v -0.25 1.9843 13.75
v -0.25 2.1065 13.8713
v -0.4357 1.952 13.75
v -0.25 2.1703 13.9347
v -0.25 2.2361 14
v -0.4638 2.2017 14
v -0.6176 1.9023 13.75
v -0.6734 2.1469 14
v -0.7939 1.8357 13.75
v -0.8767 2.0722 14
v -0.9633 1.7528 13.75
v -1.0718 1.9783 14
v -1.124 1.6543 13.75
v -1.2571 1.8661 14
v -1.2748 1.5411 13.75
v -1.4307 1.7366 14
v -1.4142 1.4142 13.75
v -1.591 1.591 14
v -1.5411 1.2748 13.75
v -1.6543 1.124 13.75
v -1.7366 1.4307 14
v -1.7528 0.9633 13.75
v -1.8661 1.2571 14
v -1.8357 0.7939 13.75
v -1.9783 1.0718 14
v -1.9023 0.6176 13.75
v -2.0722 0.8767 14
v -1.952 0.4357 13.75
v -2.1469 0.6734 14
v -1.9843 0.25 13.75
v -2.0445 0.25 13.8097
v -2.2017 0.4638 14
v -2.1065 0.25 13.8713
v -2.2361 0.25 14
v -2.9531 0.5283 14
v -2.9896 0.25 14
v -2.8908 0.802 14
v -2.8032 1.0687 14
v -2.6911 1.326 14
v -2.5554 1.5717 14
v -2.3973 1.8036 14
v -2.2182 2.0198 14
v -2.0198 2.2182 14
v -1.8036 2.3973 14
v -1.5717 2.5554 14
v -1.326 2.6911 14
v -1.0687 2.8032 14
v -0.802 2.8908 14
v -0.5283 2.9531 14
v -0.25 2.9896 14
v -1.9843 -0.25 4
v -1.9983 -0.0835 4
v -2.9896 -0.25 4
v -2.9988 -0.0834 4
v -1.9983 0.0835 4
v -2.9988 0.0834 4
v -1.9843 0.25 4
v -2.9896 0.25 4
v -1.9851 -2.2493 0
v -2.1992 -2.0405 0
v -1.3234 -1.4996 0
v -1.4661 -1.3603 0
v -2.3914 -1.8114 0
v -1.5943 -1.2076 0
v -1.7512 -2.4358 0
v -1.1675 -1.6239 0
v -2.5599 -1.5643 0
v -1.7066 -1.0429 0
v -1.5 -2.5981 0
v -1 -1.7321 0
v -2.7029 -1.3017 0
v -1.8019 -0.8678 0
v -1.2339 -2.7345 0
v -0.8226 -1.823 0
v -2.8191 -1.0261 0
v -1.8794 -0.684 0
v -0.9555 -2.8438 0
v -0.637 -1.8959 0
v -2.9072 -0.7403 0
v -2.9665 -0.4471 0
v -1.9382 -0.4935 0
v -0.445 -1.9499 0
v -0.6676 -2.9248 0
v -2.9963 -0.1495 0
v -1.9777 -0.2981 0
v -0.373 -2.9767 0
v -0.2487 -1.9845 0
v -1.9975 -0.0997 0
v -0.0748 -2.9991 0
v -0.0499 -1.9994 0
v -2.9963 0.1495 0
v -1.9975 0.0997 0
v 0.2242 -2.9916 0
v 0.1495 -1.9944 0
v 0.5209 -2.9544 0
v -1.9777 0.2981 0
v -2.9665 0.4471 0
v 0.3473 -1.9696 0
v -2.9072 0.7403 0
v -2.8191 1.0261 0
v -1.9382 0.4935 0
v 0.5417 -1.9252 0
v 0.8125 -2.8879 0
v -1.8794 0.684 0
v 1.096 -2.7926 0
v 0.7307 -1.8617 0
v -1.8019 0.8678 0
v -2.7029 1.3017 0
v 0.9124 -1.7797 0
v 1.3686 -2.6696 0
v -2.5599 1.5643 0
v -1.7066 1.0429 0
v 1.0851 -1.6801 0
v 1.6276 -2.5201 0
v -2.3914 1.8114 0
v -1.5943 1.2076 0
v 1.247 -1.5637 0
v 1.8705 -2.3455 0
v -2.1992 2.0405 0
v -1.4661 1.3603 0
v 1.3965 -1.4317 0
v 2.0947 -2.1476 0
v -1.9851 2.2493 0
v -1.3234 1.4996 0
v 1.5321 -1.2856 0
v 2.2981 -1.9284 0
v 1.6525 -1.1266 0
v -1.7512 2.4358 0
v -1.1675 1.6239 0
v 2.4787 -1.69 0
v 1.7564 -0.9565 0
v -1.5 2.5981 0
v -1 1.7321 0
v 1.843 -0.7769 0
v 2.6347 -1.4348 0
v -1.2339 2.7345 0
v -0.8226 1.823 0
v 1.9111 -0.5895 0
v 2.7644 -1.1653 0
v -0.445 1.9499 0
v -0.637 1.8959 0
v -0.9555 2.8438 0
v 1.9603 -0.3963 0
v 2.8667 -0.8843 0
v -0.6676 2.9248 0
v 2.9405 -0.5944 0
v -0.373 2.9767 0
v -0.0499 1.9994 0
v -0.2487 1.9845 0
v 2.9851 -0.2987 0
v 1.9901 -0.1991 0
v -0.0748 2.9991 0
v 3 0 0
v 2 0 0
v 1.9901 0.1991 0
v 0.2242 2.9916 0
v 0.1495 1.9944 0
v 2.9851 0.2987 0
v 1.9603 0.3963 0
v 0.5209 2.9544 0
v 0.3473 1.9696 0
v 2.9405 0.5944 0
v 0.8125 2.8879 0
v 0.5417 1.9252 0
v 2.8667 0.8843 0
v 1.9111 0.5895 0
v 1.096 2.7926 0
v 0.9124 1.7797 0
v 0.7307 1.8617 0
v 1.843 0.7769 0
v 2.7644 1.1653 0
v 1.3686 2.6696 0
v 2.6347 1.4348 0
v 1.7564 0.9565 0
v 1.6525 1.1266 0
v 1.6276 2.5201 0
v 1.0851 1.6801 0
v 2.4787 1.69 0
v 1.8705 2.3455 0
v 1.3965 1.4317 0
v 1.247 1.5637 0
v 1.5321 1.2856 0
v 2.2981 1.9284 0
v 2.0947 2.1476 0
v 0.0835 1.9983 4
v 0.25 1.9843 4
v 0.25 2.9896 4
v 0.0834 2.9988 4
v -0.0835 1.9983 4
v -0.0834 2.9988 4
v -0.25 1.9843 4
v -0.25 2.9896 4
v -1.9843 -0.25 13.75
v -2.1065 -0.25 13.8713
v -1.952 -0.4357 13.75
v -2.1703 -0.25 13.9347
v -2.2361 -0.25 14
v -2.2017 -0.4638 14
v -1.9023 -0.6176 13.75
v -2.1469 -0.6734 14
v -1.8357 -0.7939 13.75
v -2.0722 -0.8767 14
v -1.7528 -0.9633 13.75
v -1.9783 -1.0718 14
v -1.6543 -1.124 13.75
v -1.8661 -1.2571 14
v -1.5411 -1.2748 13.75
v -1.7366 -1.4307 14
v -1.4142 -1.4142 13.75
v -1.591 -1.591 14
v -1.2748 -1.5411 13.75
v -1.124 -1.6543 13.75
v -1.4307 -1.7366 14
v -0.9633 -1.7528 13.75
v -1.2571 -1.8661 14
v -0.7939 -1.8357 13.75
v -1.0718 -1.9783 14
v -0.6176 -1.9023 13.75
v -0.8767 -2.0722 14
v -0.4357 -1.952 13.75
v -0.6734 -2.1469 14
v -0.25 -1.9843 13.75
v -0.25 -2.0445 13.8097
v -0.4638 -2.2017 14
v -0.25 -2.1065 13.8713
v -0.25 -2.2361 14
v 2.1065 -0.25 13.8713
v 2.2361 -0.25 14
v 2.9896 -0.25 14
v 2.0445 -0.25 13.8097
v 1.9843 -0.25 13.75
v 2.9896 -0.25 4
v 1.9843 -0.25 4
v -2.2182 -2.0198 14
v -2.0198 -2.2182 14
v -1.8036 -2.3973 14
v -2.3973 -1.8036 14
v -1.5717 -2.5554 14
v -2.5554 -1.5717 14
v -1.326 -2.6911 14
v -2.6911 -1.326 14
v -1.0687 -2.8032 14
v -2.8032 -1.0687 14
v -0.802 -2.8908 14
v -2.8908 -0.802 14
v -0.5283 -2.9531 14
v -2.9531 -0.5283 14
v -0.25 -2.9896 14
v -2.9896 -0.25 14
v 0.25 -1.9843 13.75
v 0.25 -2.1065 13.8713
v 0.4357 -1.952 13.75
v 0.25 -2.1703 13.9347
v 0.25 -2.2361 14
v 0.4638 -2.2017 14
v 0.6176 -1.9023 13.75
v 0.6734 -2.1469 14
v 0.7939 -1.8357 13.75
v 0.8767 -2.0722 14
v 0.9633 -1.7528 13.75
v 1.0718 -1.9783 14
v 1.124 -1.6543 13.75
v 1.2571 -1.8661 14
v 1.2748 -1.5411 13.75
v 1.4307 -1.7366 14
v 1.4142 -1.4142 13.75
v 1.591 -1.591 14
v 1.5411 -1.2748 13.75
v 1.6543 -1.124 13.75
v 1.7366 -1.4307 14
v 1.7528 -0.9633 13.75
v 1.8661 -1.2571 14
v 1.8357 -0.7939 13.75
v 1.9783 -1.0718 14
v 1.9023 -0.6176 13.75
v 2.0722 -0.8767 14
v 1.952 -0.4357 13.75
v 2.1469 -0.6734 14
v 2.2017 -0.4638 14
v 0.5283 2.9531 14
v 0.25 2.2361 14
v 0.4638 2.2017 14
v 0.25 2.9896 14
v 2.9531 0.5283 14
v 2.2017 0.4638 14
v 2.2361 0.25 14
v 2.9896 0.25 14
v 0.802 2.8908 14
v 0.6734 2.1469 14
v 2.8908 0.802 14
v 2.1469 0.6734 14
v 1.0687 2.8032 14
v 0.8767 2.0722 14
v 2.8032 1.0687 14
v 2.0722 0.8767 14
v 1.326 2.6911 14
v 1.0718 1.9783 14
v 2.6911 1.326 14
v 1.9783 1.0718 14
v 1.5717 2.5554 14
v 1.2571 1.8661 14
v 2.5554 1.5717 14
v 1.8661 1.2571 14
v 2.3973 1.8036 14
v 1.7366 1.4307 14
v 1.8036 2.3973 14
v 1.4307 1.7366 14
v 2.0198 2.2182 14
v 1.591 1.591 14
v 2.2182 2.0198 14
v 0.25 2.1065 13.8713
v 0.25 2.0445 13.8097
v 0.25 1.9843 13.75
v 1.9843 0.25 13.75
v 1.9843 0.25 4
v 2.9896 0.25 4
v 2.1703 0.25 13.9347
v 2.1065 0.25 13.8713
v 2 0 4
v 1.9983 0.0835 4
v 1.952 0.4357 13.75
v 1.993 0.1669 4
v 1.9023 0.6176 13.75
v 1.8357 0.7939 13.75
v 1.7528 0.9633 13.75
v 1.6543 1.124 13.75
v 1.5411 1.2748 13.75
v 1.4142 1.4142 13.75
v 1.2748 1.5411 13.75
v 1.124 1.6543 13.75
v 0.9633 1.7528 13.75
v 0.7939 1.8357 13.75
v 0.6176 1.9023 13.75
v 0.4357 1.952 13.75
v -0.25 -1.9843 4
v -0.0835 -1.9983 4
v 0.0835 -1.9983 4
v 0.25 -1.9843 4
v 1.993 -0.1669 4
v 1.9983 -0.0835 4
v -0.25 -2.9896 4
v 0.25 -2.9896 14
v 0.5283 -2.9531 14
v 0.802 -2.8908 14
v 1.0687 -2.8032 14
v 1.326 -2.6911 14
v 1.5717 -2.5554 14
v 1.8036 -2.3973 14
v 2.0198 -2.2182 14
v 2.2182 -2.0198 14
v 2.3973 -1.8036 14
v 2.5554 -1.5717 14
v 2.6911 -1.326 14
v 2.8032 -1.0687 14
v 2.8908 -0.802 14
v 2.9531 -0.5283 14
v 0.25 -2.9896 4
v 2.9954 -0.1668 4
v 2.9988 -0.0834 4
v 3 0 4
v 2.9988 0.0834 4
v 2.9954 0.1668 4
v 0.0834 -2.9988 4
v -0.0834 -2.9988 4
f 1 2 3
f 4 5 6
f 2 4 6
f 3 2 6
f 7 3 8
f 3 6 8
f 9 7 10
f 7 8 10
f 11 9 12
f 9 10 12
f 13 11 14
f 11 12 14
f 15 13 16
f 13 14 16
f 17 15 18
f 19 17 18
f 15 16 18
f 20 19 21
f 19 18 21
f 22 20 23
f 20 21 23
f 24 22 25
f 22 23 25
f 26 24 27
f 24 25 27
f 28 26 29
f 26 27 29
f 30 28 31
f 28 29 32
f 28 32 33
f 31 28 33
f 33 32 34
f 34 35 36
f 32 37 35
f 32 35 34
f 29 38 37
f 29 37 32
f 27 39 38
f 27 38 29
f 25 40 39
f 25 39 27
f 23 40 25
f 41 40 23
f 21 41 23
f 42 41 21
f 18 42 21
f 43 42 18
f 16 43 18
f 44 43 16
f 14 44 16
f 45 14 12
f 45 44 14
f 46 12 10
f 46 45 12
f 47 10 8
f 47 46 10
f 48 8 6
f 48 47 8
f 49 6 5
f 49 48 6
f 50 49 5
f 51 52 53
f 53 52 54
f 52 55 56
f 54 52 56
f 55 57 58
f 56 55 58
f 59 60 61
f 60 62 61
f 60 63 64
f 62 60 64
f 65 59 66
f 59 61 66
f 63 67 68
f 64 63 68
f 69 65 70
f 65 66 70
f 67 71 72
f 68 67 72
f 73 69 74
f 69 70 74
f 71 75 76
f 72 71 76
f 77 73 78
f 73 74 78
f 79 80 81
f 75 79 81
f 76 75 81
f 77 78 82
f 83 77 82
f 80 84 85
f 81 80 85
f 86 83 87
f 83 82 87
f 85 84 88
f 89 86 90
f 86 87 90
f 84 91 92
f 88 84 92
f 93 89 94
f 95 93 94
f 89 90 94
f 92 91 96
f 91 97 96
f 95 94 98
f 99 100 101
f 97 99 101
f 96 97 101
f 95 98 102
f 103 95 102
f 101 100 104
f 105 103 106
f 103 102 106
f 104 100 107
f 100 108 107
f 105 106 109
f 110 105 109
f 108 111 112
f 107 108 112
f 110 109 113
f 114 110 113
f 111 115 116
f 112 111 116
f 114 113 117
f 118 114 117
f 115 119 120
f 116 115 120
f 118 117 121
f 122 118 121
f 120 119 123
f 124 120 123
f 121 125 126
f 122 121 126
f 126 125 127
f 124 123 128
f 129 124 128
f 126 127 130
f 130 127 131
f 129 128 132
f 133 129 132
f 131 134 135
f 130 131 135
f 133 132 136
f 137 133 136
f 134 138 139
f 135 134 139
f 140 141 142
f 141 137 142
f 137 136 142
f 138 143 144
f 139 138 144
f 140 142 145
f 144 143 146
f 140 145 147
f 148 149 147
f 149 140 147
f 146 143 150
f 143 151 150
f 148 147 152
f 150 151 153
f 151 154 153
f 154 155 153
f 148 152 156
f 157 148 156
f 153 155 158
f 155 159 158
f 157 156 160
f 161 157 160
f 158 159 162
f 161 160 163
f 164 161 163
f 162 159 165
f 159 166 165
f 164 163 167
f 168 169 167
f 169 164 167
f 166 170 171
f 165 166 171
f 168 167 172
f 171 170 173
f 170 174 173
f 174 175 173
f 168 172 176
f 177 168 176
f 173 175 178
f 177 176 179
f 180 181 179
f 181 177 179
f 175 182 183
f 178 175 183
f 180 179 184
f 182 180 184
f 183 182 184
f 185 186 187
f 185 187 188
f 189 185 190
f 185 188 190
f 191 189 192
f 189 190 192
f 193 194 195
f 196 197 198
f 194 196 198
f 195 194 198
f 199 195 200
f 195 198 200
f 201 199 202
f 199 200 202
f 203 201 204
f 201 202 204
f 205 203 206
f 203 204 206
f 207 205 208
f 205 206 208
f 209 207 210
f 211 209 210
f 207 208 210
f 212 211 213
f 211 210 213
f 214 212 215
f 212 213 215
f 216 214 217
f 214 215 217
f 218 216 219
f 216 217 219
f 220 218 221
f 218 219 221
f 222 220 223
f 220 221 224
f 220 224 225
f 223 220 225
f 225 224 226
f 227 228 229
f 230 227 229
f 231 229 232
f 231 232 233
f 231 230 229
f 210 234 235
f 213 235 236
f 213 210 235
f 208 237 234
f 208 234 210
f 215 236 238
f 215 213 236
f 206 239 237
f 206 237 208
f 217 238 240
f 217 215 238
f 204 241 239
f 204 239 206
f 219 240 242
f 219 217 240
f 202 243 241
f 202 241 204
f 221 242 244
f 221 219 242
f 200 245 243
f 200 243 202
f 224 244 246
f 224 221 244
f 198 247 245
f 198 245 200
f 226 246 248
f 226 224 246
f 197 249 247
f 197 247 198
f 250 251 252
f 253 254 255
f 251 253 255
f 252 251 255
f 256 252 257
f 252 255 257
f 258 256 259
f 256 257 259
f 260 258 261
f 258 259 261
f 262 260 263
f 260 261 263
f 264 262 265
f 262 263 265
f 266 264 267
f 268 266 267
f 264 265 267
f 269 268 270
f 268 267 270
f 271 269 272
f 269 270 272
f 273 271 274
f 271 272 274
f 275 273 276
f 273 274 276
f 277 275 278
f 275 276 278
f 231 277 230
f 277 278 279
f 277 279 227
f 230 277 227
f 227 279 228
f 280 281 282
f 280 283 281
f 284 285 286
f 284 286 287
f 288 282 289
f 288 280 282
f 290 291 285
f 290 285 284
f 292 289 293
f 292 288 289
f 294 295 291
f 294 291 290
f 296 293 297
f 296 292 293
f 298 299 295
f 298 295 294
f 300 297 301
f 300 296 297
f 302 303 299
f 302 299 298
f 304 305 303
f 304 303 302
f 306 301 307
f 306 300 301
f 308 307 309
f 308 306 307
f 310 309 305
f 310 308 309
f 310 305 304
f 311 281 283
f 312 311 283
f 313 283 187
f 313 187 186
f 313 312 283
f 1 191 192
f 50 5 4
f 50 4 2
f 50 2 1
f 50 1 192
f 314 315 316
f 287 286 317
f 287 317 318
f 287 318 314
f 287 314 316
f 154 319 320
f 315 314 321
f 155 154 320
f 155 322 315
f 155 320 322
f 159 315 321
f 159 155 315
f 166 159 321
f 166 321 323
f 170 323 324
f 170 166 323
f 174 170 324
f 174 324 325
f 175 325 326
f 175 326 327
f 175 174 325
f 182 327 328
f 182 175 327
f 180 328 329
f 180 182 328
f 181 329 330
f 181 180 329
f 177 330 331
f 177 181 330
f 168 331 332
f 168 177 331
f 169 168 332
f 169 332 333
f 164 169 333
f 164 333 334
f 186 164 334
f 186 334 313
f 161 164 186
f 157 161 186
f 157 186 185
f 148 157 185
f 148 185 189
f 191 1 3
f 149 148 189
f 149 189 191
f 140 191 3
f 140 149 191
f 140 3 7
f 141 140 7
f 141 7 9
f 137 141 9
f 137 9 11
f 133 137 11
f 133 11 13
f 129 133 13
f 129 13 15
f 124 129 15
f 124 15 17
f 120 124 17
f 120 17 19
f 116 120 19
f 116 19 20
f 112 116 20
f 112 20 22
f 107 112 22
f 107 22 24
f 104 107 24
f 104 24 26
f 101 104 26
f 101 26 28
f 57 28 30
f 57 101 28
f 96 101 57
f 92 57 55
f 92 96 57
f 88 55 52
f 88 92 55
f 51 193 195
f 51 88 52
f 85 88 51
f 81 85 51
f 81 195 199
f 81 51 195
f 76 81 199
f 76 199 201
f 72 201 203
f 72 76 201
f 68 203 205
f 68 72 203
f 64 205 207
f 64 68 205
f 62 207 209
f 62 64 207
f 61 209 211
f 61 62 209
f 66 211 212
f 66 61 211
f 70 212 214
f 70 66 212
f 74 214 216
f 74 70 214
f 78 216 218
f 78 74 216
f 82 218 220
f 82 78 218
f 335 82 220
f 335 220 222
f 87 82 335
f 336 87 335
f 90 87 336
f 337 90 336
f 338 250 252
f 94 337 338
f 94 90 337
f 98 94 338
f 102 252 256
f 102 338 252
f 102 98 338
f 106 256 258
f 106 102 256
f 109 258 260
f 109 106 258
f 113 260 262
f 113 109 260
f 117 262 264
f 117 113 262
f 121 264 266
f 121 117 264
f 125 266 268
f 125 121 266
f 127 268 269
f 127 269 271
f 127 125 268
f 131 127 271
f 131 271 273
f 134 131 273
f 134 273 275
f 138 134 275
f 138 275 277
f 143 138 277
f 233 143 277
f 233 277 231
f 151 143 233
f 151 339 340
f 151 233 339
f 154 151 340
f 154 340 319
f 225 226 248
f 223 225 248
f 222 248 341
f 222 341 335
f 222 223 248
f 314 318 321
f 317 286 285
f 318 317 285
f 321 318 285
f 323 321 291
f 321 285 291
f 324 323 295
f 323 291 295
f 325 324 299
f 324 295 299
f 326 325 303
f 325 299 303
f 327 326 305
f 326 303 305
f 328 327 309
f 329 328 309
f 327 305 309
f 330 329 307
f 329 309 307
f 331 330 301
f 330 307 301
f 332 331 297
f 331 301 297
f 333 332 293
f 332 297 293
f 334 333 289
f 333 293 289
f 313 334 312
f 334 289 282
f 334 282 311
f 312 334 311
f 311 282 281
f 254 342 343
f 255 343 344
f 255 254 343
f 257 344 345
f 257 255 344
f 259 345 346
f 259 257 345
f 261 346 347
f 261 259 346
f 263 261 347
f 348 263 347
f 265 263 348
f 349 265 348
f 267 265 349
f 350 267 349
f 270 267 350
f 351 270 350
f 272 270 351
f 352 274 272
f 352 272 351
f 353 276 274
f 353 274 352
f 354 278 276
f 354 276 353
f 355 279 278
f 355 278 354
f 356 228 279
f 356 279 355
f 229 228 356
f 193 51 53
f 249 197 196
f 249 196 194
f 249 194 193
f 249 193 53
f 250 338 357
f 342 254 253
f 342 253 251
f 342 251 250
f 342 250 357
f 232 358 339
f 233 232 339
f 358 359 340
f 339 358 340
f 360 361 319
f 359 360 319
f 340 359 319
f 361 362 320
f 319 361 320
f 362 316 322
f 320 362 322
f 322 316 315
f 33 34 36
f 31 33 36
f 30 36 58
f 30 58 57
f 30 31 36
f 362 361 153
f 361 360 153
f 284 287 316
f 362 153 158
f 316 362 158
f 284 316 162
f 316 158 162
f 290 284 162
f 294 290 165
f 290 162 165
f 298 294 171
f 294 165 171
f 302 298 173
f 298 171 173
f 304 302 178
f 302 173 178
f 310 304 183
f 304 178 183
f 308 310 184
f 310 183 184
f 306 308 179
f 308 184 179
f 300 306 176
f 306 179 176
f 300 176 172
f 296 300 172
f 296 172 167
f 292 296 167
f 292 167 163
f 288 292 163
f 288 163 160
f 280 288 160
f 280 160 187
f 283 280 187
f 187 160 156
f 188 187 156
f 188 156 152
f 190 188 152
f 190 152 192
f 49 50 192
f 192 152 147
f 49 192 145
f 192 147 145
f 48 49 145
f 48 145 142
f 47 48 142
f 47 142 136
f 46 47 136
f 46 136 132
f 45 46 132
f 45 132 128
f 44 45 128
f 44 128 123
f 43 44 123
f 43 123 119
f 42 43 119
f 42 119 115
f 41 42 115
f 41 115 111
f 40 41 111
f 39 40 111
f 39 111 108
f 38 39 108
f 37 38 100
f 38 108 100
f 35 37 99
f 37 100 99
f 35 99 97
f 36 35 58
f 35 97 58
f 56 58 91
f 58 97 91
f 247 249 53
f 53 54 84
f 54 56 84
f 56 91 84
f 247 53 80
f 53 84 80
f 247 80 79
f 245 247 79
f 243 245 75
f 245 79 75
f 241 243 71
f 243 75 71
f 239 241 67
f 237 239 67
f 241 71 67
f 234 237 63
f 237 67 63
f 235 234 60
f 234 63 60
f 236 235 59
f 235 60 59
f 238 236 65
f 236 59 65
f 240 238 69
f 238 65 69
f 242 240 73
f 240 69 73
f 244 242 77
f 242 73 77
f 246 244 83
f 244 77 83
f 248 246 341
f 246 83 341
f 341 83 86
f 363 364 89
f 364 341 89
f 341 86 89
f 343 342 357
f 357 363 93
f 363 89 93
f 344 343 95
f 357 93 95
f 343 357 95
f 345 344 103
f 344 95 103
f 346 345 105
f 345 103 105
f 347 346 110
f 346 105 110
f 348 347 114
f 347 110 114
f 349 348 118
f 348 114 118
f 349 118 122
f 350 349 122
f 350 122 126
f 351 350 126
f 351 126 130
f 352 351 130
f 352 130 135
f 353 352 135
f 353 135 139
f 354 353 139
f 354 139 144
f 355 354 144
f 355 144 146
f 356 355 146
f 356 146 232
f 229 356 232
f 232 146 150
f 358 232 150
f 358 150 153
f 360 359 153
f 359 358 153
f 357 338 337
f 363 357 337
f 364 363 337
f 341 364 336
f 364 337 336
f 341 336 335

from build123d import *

# Parameters (mm, degrees)
ESQUISSE1_R             = 3
ESQUISSE1_R_2           = 2
EXTRUSION1_DEPTH        = 14
CHANFREIN1_SIZE         = 0.25
ENL_V_MAT_EXTRU_1_DEPTH = 10


with BuildPart() as part:
    # Esquisse1 → Extrusion1 (new body)
    with BuildSketch(Plane.XY):
        Circle(ESQUISSE1_R)
        Circle(ESQUISSE1_R_2, mode=Mode.SUBTRACT)
    extrude(amount=EXTRUSION1_DEPTH)

    # Chanfrein1
    chanfrein1_edges = [part.edges().sort_by_distance(p)[0] for p in [
        (-2, 0, 14),
    ]]
    chamfer(chanfrein1_edges, length=CHANFREIN1_SIZE)

    # Esquisse4 → Enlèv. mat.-Extru.1 (cut)
    with BuildSketch(Plane.XY.offset(14)):
        with BuildLine():
            Line((0.25, 2.989565186), (0.25, 0.25))
            Line((0.25, 0.25), (2.989565186, 0.25))
            ThreePointArc((2.989565186, 0.25), (3, 0), (2.989565186, -0.25))
            Line((2.989565186, -0.25), (0.25, -0.25))
            Line((0.25, -0.25), (0.25, -2.989565186))
            ThreePointArc((0.25, -2.989565186), (0, -3), (-0.25, -2.989565186))
            Line((-0.25, -2.989565186), (-0.25, -0.25))
            Line((-0.25, -0.25), (-2.989565186, -0.25))
            ThreePointArc((-2.989565186, -0.25), (-3, 0), (-2.989565186, 0.25))
            Line((-2.989565186, 0.25), (-0.25, 0.25))
            Line((-0.25, 0.25), (-0.25, 2.989565186))
            ThreePointArc((-0.25, 2.989565186), (0, 3), (0.25, 2.989565186))
        make_face()
    extrude(amount=-ENL_V_MAT_EXTRU_1_DEPTH, mode=Mode.SUBTRACT)


solid = part.part
